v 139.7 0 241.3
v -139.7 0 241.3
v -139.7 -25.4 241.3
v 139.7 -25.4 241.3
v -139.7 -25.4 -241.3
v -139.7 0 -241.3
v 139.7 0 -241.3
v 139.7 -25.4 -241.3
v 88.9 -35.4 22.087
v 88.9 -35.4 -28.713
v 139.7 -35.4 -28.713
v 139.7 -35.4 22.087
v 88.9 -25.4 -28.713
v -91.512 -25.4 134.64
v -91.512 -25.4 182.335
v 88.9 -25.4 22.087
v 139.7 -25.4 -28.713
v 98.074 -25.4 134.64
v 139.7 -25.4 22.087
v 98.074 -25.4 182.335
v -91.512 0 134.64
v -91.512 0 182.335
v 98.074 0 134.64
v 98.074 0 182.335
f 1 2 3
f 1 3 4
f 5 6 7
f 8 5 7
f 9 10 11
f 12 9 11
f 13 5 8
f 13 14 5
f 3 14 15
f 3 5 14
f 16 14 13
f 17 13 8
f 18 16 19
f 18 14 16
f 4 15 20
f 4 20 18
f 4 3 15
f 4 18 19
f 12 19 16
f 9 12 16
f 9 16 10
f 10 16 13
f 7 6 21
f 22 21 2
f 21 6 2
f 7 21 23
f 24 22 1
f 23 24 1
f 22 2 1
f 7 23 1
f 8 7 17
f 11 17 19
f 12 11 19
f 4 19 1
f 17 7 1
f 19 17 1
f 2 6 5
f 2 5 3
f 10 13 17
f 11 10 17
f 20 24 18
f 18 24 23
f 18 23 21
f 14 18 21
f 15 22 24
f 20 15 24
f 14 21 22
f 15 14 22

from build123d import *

# Parameters (mm, degrees)
F0_W     = 279.4
F0_H     = 482.6
F1_DEPTH = 25.4
F3_DEPTH = 10


with BuildPart() as f1:
    # F0 (on Front) → F1 (new body)
    with BuildSketch(Plane.XZ):
        Rectangle(F0_W, F0_H)
        Polygon((-91.511846, 158.487543), (-91.511846, 182.334796), (98.073885, 182.334796), (98.073885, 158.487543), (98.073885, 134.640291), (-91.511846, 134.640291), align=None, mode=Mode.SUBTRACT)
    extrude(amount=F1_DEPTH)

    # F2 (on face) → F3 (join)
    with BuildSketch(Plane.XZ.offset(25.4)):
        with BuildLine():
            ThreePointArc((114.3, -28.713468), (96.339488, -21.273981), (88.9, -3.313468))
            Line((88.9, -3.313468), (88.9, -28.713468))
            Line((88.9, -28.713468), (114.3, -28.713468))
        make_face()
        with BuildLine():
            Line((139.7, -28.713468), (139.7, -3.313468))
            ThreePointArc((139.7, -3.313468), (132.260512, -21.273981), (114.3, -28.713468))
            Line((114.3, -28.713468), (139.7, -28.713468))
        make_face()
        with BuildLine():
            ThreePointArc((88.9, -3.313468), (96.339488, 14.647044), (114.3, 22.086532))
            Line((114.3, 22.086532), (88.9, 22.086532))
            Line((88.9, 22.086532), (88.9, -3.313468))
        make_face()
        with BuildLine():
            ThreePointArc((139.7, -3.313468), (132.260512, 14.647044), (114.3, 22.086532))
            ThreePointArc((114.3, 22.086532), (96.339488, 14.647044), (88.9, -3.313468))
            ThreePointArc((88.9, -3.313468), (96.339488, -21.273981), (114.3, -28.713468))
            ThreePointArc((114.3, -28.713468), (132.260512, -21.273981), (139.7, -3.313468))
        make_face()
        with BuildLine():
            Line((139.7, -3.313468), (139.7, 22.086532))
            Line((139.7, 22.086532), (114.3, 22.086532))
            ThreePointArc((114.3, 22.086532), (132.260512, 14.647044), (139.7, -3.313468))
        make_face()
    extrude(amount=F3_DEPTH)


solid = f1.part
